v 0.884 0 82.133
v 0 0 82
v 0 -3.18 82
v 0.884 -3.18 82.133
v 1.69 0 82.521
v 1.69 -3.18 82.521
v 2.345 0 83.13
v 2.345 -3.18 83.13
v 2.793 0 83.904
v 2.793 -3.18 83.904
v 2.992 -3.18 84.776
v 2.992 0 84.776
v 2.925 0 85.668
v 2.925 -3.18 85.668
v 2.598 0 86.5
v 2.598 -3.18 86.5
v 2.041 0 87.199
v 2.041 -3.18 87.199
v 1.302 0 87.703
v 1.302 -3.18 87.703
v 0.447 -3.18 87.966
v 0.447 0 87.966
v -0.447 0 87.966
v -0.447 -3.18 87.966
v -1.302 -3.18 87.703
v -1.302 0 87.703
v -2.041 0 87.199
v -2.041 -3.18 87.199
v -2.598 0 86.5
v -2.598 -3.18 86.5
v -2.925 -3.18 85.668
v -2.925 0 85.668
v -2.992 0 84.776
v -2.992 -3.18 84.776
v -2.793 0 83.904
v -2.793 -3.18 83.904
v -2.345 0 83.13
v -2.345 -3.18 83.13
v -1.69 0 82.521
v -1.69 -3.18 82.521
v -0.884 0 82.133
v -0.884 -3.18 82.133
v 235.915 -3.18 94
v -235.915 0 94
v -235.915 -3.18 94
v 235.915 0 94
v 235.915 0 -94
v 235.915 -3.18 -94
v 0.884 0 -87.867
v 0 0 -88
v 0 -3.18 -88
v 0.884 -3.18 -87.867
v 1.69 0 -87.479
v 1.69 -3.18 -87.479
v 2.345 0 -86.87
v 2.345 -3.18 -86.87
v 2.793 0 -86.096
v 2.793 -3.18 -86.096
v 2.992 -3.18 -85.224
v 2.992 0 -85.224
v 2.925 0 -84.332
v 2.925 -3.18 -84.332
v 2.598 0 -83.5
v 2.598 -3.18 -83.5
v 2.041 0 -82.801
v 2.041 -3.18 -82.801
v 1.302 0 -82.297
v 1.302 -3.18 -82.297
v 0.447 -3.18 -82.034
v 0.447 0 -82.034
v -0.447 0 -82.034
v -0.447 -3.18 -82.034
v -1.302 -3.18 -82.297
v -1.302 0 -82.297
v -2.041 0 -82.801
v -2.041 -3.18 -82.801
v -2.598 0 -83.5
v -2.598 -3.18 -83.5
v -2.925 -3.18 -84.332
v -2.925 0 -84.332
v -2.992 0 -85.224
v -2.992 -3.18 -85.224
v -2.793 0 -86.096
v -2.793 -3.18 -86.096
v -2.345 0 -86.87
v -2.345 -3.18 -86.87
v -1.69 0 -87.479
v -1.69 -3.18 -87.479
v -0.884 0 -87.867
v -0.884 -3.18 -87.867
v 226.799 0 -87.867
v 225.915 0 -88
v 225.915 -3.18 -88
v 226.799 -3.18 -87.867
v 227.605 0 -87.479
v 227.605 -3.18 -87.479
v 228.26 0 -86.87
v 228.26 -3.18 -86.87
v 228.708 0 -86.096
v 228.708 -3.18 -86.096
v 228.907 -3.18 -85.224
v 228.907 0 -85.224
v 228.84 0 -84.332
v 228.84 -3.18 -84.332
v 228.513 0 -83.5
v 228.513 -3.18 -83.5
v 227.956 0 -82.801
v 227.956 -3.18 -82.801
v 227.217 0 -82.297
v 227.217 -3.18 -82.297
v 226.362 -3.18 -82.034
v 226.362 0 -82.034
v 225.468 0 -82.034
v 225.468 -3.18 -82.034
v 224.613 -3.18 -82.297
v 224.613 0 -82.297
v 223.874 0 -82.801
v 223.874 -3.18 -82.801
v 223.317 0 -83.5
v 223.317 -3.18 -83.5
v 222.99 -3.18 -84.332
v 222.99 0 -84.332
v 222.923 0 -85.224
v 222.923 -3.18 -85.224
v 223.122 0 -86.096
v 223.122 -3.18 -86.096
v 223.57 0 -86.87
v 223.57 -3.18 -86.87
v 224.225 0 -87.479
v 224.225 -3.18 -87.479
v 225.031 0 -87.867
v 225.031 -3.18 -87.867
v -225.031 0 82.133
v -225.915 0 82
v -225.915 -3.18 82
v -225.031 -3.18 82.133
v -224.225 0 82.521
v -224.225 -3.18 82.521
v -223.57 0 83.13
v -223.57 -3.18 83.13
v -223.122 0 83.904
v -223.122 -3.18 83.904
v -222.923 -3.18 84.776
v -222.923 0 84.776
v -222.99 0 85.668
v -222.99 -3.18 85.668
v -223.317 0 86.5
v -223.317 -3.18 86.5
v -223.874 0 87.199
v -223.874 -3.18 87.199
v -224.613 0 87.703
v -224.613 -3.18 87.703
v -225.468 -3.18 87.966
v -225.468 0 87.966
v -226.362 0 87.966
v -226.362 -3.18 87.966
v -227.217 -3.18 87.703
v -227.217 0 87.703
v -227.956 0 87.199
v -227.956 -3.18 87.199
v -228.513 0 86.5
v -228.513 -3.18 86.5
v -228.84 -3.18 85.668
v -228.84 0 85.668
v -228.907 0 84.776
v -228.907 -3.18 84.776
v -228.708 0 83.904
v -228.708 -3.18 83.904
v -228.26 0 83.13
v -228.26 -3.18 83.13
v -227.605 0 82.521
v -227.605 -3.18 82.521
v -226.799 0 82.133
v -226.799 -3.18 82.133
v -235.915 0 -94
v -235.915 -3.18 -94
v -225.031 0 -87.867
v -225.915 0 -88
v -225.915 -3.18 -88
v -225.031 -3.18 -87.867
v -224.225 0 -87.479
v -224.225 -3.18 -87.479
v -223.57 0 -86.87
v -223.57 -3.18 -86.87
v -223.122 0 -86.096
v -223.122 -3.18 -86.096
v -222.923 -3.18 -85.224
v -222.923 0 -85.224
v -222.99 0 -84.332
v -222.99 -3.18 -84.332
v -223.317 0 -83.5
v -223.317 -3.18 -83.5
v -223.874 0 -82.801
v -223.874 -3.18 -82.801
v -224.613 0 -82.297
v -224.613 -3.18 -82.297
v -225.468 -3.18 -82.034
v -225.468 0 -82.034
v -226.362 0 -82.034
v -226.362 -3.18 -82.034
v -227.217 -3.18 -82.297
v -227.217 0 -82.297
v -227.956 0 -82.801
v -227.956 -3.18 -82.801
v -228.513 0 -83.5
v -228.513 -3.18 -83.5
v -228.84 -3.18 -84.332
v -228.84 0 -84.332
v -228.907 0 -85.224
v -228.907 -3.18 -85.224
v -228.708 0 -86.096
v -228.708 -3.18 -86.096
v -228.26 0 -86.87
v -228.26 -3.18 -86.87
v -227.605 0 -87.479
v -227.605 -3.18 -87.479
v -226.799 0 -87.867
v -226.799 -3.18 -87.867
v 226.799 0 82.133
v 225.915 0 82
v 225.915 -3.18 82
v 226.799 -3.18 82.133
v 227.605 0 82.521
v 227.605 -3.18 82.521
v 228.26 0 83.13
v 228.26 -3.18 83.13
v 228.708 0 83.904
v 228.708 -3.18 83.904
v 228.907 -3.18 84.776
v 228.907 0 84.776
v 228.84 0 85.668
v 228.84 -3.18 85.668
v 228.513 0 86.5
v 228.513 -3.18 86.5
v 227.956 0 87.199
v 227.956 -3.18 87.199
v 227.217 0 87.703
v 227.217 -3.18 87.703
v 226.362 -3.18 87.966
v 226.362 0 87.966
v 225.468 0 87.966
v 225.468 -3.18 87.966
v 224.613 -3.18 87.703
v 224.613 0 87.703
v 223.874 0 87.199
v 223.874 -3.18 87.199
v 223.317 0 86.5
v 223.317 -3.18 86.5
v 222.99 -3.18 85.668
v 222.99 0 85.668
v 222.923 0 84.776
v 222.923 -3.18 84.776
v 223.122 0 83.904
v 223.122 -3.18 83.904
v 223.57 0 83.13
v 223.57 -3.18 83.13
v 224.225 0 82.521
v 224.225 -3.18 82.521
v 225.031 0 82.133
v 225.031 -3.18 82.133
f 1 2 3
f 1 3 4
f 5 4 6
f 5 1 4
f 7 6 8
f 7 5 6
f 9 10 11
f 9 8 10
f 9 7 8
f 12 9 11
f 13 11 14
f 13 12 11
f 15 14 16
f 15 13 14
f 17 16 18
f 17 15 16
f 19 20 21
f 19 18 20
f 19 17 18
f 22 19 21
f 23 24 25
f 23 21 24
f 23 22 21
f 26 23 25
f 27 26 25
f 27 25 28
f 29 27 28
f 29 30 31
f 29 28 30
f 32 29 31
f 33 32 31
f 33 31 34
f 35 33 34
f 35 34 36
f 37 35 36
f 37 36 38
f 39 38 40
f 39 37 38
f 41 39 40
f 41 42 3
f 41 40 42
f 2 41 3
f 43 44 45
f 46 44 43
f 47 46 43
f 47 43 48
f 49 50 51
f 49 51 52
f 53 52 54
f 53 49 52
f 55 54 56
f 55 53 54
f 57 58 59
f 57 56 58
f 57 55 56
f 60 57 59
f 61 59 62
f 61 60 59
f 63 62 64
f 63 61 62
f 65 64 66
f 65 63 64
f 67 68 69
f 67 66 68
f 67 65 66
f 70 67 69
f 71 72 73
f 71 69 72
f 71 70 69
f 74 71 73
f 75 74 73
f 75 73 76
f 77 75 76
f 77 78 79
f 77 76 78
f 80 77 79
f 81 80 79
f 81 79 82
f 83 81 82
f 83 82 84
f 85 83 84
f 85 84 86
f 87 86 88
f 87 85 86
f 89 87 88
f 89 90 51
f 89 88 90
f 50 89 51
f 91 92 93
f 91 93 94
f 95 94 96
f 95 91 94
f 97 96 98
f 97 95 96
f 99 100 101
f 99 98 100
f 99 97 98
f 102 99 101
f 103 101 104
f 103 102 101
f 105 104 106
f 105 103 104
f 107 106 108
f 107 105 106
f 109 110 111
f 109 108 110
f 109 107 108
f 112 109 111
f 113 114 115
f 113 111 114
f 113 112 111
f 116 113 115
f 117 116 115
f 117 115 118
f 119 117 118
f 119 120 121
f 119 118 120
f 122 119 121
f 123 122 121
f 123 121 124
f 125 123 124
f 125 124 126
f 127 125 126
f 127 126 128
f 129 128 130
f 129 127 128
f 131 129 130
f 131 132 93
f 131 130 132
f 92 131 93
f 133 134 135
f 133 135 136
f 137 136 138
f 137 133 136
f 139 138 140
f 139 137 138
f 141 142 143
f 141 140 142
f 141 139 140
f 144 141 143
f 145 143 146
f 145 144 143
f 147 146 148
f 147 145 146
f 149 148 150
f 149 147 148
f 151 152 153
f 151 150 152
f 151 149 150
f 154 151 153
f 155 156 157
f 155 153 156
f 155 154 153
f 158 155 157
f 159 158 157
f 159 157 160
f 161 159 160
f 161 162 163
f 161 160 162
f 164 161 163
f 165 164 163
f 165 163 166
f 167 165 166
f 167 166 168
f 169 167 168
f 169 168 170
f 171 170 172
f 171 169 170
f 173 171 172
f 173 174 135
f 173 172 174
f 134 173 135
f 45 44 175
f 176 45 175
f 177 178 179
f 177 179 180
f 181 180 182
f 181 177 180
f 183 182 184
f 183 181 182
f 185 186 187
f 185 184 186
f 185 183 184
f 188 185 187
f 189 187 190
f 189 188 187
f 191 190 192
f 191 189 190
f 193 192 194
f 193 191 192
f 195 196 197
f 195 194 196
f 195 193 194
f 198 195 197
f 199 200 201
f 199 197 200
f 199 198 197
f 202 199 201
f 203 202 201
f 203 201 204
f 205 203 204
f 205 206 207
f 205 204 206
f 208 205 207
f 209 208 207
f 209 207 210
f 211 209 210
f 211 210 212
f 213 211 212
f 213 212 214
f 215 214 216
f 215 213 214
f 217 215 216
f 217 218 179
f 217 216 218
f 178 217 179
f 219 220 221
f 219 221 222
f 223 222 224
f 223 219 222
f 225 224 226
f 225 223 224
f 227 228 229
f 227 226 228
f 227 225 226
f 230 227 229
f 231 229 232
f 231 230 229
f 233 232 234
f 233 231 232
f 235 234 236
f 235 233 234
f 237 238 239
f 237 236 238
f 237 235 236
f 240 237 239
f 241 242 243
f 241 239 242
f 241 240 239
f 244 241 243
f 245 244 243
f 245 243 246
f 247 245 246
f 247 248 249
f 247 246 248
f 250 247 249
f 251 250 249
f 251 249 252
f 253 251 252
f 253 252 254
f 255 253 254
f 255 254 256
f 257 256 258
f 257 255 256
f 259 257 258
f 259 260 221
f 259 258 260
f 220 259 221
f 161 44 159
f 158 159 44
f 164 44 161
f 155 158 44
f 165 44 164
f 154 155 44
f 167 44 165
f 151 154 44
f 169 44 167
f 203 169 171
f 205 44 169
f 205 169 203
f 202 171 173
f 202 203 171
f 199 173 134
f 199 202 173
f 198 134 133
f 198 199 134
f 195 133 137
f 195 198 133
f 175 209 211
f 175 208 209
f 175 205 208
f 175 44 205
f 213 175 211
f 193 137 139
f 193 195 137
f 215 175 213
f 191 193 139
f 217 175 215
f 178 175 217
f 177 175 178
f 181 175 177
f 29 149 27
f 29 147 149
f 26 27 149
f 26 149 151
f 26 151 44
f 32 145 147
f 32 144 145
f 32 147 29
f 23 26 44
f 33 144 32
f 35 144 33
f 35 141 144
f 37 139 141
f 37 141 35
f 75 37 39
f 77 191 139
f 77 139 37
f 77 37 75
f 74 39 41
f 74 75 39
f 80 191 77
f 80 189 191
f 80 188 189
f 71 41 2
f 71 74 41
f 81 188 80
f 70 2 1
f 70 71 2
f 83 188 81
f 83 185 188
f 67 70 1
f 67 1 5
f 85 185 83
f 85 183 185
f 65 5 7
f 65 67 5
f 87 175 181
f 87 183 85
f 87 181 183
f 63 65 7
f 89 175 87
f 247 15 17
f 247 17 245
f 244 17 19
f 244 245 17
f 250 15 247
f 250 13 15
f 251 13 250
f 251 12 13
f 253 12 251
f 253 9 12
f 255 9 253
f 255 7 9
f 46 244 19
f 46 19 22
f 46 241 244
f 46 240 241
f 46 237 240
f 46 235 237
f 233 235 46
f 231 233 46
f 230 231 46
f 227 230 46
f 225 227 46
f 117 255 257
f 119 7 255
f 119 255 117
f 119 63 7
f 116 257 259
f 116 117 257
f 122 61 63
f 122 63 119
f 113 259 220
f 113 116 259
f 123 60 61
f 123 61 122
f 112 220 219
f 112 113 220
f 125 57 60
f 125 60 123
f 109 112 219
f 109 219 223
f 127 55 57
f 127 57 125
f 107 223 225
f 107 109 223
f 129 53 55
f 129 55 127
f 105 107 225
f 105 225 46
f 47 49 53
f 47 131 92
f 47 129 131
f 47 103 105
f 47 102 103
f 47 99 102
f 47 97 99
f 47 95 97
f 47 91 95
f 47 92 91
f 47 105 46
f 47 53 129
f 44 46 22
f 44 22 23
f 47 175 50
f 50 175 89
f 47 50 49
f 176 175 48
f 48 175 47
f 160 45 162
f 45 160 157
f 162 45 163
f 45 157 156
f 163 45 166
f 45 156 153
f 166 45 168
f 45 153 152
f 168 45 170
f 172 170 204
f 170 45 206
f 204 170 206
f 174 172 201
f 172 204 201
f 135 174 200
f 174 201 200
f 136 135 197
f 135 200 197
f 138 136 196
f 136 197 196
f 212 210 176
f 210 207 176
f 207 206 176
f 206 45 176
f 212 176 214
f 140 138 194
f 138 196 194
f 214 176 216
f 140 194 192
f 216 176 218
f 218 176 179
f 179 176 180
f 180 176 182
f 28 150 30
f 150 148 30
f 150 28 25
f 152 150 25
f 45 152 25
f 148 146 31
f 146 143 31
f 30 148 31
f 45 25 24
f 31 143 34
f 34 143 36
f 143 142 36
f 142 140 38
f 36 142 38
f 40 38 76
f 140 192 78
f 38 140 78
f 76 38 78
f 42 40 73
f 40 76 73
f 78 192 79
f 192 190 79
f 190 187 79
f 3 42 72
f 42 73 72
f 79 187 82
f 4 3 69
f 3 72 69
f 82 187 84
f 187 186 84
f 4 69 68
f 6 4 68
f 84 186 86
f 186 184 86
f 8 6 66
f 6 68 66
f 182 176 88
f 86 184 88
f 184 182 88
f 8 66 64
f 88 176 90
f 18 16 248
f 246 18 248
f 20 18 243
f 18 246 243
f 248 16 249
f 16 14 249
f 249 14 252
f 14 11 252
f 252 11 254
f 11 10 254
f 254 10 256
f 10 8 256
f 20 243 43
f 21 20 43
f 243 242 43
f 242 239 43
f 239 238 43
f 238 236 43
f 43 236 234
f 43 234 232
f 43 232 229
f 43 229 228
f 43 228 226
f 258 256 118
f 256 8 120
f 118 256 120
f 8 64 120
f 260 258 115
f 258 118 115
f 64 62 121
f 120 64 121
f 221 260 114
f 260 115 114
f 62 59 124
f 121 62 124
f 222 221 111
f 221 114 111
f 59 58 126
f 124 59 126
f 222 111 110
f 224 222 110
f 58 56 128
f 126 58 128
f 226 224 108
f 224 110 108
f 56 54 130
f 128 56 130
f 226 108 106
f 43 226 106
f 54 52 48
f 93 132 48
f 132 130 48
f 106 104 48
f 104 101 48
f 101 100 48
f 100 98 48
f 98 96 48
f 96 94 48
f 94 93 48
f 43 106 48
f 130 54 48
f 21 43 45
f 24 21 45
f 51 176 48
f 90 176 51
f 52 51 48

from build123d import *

# Parameters (mm, degrees)
SKETCH1_W               = 471.83
SKETCH1_H               = 188
BASE_FLANGE2_DEPTH      = 3.18
CUT_EXTRUDE1_DEPTH      = 254.972438711
CUT_EXTRUDE1_DEPTH_BACK = 254.972438711
SKETCH2_R               = 3


# Sheet-metal steps are written as plain solids
with BuildPart() as part:
    # Sketch1 → Base-Flange2 (new body)
    with BuildSketch(Plane(origin=(0, 0, 0), x_dir=(1, 0, 0), z_dir=(0, 1, 0))):
        Rectangle(SKETCH1_W, SKETCH1_H)
    extrude(amount=-BASE_FLANGE2_DEPTH)

    # Sketch2 → Cut-Extrude1 (cut, two sides: drawn at the far end of the back side and taken through both)
    with BuildSketch(Plane.XZ.offset(3.18).offset(-CUT_EXTRUDE1_DEPTH_BACK)):
        with Locations(Location((-225.915, 85, 0), (0, 0, 270))):
            Circle(SKETCH2_R)
        with Locations(Location((-225.915, -85, 0), (0, 0, 270))):
            Circle(SKETCH2_R)
        with Locations(Location((225.915, -85, 0), (0, 0, 270))):
            Circle(SKETCH2_R)
        with Locations(Location((225.915, 85, 0), (0, 0, 270))):
            Circle(SKETCH2_R)
        with Locations(Location((0, 85, 0), (0, 0, 270))):
            Circle(SKETCH2_R)
        with Locations(Location((0, -85, 0), (0, 0, 270))):
            Circle(SKETCH2_R)
    extrude(amount=CUT_EXTRUDE1_DEPTH + CUT_EXTRUDE1_DEPTH_BACK, mode=Mode.SUBTRACT)


solid = part.part
